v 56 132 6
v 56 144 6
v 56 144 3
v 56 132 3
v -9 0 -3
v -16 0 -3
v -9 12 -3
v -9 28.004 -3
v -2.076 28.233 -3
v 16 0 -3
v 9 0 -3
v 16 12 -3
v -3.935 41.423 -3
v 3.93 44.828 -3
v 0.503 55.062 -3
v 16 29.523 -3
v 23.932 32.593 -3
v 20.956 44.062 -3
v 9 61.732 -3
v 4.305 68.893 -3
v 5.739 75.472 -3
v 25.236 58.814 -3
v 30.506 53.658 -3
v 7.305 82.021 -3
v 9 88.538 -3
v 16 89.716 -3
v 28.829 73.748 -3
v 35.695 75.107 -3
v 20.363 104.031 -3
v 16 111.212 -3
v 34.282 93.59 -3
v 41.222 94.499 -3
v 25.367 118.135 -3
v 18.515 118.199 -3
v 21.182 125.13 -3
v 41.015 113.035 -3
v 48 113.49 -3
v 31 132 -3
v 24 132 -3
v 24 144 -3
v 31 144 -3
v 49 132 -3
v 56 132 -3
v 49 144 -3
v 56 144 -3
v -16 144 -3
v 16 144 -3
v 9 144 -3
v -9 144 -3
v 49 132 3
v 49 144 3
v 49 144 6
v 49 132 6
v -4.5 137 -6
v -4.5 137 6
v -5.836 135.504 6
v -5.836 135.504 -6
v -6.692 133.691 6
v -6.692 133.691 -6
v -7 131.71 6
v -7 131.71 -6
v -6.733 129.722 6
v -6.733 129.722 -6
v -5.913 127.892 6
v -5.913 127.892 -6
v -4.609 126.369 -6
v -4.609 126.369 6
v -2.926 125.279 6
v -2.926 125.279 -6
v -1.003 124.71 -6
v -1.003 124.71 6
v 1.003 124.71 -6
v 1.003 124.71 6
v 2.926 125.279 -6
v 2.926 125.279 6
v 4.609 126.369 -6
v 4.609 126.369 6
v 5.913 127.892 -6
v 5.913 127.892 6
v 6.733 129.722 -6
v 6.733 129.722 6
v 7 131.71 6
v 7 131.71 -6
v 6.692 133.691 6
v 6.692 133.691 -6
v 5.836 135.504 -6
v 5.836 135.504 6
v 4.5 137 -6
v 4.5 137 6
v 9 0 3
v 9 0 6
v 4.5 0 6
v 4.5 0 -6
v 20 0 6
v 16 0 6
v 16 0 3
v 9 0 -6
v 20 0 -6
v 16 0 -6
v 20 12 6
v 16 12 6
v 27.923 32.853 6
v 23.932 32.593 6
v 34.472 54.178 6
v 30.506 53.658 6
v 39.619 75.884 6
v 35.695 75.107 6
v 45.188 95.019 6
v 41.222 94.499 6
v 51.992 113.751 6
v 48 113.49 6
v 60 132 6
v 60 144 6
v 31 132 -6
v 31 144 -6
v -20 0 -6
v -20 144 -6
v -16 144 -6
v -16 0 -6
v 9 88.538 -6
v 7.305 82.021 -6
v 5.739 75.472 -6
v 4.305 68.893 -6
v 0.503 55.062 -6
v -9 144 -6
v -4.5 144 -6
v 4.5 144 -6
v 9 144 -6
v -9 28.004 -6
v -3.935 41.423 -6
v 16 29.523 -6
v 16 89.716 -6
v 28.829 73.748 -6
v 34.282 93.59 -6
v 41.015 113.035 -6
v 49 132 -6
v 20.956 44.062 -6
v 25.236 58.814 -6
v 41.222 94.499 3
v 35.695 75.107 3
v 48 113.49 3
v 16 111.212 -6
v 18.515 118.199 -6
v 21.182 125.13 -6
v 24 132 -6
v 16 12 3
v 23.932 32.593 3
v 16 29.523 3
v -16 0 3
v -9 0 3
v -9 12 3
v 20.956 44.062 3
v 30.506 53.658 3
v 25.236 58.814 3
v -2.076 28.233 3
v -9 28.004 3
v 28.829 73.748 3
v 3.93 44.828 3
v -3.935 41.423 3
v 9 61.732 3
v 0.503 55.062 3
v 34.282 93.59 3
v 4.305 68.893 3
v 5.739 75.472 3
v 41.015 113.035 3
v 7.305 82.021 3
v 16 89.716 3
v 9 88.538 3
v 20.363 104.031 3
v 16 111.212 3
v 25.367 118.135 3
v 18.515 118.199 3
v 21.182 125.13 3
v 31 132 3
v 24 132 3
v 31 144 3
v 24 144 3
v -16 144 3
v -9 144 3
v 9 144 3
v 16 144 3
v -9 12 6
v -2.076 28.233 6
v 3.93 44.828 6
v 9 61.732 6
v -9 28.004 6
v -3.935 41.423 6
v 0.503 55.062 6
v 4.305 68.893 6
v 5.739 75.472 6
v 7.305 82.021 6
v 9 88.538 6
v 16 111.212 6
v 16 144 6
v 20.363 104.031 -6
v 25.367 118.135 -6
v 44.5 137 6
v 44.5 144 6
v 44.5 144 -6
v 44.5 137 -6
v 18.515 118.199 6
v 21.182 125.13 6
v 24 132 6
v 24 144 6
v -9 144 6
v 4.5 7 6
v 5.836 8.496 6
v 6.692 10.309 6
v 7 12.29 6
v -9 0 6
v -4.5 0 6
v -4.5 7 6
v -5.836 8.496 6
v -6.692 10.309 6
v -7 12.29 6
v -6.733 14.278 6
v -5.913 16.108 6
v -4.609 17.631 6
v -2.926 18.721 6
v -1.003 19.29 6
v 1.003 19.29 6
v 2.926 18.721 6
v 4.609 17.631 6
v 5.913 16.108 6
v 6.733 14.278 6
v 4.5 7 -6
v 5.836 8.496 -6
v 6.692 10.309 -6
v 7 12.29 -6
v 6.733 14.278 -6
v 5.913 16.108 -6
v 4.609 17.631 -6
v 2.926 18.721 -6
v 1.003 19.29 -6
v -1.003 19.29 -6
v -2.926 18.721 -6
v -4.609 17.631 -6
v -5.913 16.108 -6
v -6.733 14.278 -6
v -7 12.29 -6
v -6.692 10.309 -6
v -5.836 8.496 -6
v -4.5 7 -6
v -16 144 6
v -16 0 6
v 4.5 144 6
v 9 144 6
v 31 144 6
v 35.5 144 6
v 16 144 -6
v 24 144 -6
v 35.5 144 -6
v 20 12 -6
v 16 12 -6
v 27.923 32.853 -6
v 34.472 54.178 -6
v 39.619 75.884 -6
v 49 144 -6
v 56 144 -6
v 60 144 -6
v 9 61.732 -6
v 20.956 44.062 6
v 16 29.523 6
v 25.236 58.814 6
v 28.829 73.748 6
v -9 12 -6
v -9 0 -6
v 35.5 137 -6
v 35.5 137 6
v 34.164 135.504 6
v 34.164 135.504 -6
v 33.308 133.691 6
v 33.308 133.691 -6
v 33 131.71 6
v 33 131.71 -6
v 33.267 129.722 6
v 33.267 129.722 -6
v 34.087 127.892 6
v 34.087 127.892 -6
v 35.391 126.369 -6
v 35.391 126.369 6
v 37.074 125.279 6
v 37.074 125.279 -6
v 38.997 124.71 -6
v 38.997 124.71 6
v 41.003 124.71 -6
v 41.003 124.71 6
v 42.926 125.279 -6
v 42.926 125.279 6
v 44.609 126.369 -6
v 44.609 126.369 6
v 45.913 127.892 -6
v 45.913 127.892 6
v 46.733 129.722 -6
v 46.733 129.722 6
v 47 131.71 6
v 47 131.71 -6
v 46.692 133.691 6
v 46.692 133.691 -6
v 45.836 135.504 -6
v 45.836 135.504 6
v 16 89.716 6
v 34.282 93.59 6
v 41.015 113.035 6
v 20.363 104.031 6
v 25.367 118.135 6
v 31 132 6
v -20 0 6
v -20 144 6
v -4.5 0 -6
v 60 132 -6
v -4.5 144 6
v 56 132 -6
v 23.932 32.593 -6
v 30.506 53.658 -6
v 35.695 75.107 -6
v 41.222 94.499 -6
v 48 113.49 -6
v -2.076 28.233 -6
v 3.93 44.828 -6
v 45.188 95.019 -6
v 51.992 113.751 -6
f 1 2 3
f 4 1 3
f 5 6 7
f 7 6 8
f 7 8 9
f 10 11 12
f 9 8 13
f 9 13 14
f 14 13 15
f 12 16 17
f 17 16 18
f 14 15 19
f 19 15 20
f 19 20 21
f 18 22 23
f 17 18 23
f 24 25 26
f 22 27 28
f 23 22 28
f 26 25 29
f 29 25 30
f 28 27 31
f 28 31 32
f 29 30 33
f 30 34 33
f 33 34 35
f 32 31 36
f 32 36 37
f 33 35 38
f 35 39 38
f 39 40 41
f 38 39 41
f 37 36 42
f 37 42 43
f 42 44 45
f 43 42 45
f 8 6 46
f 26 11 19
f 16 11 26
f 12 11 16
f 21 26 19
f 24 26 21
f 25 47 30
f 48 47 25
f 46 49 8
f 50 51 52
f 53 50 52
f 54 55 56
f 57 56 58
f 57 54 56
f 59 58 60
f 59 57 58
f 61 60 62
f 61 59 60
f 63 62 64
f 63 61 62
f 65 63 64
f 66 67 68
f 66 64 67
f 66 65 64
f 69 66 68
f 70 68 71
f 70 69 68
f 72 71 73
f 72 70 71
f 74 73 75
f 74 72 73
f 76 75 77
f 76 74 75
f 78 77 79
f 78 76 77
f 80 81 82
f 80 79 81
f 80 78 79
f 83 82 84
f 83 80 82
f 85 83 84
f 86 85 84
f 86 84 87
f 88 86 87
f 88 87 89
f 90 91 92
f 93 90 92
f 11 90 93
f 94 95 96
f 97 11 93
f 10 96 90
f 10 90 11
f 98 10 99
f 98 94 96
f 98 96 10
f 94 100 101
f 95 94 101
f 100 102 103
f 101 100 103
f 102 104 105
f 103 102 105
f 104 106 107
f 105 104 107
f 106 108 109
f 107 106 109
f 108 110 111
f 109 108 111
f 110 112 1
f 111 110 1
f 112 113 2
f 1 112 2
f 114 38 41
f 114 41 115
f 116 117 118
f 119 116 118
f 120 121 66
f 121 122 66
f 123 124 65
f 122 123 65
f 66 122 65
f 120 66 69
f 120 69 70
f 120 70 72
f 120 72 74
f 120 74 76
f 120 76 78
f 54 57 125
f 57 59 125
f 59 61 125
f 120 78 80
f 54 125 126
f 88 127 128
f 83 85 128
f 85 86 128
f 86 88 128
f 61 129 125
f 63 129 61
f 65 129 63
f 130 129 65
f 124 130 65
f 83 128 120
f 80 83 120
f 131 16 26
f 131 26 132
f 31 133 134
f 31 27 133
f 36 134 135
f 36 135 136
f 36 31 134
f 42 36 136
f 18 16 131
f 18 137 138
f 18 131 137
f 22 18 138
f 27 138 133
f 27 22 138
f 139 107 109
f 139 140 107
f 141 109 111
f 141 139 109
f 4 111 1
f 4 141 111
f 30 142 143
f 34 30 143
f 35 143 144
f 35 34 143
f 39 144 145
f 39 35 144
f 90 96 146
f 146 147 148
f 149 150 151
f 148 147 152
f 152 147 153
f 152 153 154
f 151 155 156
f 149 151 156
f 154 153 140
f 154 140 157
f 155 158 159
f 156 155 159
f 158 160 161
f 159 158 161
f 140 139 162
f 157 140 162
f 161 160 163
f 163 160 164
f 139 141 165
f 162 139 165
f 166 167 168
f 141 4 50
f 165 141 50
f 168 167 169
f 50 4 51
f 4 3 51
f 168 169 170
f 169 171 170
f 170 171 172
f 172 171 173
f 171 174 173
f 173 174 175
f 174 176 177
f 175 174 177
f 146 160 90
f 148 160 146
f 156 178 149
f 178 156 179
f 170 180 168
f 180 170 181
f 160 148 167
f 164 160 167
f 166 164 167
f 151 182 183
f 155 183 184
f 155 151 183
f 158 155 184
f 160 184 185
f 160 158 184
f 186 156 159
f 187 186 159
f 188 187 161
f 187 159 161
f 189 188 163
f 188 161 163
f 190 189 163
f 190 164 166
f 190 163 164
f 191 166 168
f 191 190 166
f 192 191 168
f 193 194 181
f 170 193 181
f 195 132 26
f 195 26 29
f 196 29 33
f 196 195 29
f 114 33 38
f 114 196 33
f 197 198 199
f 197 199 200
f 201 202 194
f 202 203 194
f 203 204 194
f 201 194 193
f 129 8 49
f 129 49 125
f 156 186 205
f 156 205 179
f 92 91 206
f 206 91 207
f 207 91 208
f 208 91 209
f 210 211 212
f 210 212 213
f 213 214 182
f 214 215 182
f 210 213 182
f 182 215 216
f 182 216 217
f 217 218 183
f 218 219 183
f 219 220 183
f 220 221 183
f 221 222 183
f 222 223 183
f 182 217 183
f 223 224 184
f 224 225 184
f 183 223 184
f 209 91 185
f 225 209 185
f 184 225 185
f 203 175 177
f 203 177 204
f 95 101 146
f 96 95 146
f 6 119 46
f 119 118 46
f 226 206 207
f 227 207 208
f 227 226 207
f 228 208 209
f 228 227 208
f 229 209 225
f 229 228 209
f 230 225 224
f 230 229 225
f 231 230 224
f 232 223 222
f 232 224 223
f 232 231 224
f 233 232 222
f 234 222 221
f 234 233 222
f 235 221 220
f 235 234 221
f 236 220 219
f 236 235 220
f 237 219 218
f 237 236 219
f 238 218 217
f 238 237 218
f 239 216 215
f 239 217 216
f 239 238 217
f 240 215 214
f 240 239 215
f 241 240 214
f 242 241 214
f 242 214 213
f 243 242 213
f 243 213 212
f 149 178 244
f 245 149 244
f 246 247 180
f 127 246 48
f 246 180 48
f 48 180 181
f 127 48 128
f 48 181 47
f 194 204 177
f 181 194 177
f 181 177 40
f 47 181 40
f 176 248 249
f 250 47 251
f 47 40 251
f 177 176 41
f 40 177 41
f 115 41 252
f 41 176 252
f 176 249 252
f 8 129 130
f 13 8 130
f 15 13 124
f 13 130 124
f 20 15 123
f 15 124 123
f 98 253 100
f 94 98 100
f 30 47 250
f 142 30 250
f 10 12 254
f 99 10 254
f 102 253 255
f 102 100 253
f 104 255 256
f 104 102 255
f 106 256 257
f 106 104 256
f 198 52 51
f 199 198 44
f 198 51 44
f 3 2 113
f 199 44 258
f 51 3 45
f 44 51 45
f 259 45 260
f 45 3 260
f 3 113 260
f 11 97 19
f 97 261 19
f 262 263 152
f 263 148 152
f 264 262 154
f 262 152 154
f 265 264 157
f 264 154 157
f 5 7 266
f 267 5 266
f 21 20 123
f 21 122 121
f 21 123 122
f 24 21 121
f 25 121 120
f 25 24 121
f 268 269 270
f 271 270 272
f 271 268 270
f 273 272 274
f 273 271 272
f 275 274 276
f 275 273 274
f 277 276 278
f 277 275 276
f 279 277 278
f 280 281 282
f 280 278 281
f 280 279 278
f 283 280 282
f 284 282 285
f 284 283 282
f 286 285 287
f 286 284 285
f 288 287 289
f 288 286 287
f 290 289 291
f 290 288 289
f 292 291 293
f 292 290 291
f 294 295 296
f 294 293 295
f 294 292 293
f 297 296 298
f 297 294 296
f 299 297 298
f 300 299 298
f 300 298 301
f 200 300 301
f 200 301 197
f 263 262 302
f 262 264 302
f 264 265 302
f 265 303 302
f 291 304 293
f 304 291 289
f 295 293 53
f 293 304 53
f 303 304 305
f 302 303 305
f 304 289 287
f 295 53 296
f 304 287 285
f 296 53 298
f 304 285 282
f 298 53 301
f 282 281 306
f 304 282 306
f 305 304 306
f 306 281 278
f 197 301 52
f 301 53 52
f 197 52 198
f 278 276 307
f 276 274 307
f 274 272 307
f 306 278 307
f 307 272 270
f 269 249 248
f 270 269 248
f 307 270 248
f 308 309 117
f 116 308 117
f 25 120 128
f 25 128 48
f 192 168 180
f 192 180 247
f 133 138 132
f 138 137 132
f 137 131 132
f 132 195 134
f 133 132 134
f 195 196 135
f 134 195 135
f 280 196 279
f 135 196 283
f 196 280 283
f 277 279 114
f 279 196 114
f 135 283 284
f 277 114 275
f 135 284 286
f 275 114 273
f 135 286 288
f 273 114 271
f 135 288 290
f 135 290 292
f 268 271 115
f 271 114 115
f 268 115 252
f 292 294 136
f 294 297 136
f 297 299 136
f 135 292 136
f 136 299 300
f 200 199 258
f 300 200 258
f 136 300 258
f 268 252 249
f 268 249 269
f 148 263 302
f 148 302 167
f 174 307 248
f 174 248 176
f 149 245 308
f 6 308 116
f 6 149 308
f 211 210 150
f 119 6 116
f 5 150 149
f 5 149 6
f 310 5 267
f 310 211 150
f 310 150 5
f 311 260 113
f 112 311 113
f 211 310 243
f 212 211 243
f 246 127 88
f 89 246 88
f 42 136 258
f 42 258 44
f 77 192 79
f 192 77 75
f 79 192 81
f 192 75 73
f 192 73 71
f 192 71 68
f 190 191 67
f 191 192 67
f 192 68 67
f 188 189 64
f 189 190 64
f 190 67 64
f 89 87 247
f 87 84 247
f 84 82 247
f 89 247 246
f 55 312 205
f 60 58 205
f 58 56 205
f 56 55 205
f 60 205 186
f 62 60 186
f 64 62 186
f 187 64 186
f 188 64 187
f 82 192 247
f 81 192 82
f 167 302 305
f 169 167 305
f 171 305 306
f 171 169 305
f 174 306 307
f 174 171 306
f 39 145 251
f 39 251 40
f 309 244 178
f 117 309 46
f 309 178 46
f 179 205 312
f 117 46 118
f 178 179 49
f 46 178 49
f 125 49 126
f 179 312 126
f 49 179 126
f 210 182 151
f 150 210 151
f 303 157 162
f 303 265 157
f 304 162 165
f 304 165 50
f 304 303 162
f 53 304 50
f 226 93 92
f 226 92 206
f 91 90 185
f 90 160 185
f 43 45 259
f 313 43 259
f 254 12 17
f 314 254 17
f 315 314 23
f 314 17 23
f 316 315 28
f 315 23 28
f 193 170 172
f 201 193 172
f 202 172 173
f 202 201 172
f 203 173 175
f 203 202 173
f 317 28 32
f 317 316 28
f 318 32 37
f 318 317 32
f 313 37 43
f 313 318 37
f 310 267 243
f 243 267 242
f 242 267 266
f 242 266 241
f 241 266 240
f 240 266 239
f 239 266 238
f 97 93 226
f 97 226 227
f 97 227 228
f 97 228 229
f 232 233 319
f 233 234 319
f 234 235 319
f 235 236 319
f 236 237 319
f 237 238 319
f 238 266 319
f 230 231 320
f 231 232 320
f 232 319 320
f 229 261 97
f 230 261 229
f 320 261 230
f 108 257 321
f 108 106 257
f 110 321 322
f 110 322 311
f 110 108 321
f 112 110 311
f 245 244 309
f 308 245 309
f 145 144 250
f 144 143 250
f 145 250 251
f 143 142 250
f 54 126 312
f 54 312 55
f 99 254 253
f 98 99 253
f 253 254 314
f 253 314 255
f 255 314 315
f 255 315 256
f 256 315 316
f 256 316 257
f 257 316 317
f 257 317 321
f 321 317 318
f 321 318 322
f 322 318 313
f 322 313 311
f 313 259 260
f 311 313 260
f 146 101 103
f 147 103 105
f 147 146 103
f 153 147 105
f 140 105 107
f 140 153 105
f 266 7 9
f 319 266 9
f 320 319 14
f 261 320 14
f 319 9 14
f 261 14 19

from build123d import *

# Parameters (mm, degrees)
SKETCH003_W          = 7
SKETCH003_H          = 3
SKETCH004_W          = 7
SKETCH004_H          = 3
SKETCH005_W          = 7
SKETCH005_H          = 3
SKETCH006_W          = 7
SKETCH006_H          = 3
POCKET_DEPTH         = 6.001
POCKET_DEPTH_BACK    = -6.001
POCKET001_DEPTH      = 6.001
POCKET001_DEPTH_BACK = -6.001
POCKET002_DEPTH      = 6.001
POCKET002_DEPTH_BACK = -6.001


with BuildPart() as part:
    # AdditivePipe: sweep along a path in Sketch
    with BuildLine(Plane.XY) as additivepipe_path:
        Line((0, 0), (0, 144))
    # Sketch002 → AdditivePipe (sweep)
    with BuildSketch(Plane.XZ):
        Polygon((-20, 6), (-20, -6), (-16, -6), (-16, -3), (-9, -3), (-9, -6), (9, -6), (9, -3), (16, -3), (16, -6), (20, -6), (20, 6), (16, 6), (16, 3), (9, 3), (9, 6), (-9, 6), (-9, 3), (-16, 3), (-16, 6), align=None)
    sweep(path=additivepipe_path.line)

    # AdditivePipe001: sweep along a path in Sketch001
    with BuildLine(Plane.XY) as additivepipe001_path:
        Line((0, 0), (0, 12))
        ThreePointArc((0, 12), (11.467071, 41.510976), (20, 72))
        ThreePointArc((20, 72), (28.532929, 102.489024), (40, 132))
        Line((40, 132), (40, 144))
    # Sketch002 → AdditivePipe001 (sweep)
    with BuildSketch(Plane.XZ):
        Polygon((-20, 6), (-20, -6), (-16, -6), (-16, -3), (-9, -3), (-9, -6), (9, -6), (9, -3), (16, -3), (16, -6), (20, -6), (20, 6), (16, 6), (16, 3), (9, 3), (9, 6), (-9, 6), (-9, 3), (-16, 3), (-16, 6), align=None)
    sweep(path=additivepipe001_path.line)

    # SubtractivePipe: sweep along a path in Sketch
    with BuildLine(Plane.XY) as subtractivepipe_path:
        Line((0, 0), (0, 144))
    # Sketch003 → SubtractivePipe (sweep, cut)
    with BuildSketch(Plane.XZ):
        with Locations((-12.5, 4.5)):
            Rectangle(SKETCH003_W, SKETCH003_H)
    sweep(path=subtractivepipe_path.line, mode=Mode.SUBTRACT)

    # SubtractivePipe001: sweep along a path in Sketch001
    with BuildLine(Plane.XY) as subtractivepipe001_path:
        Line((0, 0), (0, 12))
        ThreePointArc((0, 12), (11.467071, 41.510976), (20, 72))
        ThreePointArc((20, 72), (28.532929, 102.489024), (40, 132))
        Line((40, 132), (40, 144))
    # Sketch003 → SubtractivePipe001 (sweep, cut)
    with BuildSketch(Plane.XZ):
        with Locations((-12.5, 4.5)):
            Rectangle(SKETCH003_W, SKETCH003_H)
    sweep(path=subtractivepipe001_path.line, mode=Mode.SUBTRACT)

    # SubtractivePipe002: sweep along a path in Sketch
    with BuildLine(Plane.XY) as subtractivepipe002_path:
        Line((0, 0), (0, 144))
    # Sketch004 → SubtractivePipe002 (sweep, cut)
    with BuildSketch(Plane.XZ):
        with Locations((12.5, 4.5)):
            Rectangle(SKETCH004_W, SKETCH004_H)
    sweep(path=subtractivepipe002_path.line, mode=Mode.SUBTRACT)

    # SubtractivePipe003: sweep along a path in Sketch001
    with BuildLine(Plane.XY) as subtractivepipe003_path:
        Line((0, 0), (0, 12))
        ThreePointArc((0, 12), (11.467071, 41.510976), (20, 72))
        ThreePointArc((20, 72), (28.532929, 102.489024), (40, 132))
        Line((40, 132), (40, 144))
    # Sketch004 → SubtractivePipe003 (sweep, cut)
    with BuildSketch(Plane.XZ):
        with Locations((12.5, 4.5)):
            Rectangle(SKETCH004_W, SKETCH004_H)
    sweep(path=subtractivepipe003_path.line, mode=Mode.SUBTRACT)

    # SubtractivePipe004: sweep along a path in Sketch
    with BuildLine(Plane.XY) as subtractivepipe004_path:
        Line((0, 0), (0, 144))
    # Sketch005 → SubtractivePipe004 (sweep, cut)
    with BuildSketch(Plane.XZ):
        with Locations((-12.5, -4.5)):
            Rectangle(SKETCH005_W, SKETCH005_H)
    sweep(path=subtractivepipe004_path.line, mode=Mode.SUBTRACT)

    # SubtractivePipe005: sweep along a path in Sketch001
    with BuildLine(Plane.XY) as subtractivepipe005_path:
        Line((0, 0), (0, 12))
        ThreePointArc((0, 12), (11.467071, 41.510976), (20, 72))
        ThreePointArc((20, 72), (28.532929, 102.489024), (40, 132))
        Line((40, 132), (40, 144))
    # Sketch005 → SubtractivePipe005 (sweep, cut)
    with BuildSketch(Plane.XZ):
        with Locations((-12.5, -4.5)):
            Rectangle(SKETCH005_W, SKETCH005_H)
    sweep(path=subtractivepipe005_path.line, mode=Mode.SUBTRACT)

    # SubtractivePipe006: sweep along a path in Sketch
    with BuildLine(Plane.XY) as subtractivepipe006_path:
        Line((0, 0), (0, 144))
    # Sketch006 → SubtractivePipe006 (sweep, cut)
    with BuildSketch(Plane.XZ):
        with Locations((12.5, -4.5)):
            Rectangle(SKETCH006_W, SKETCH006_H)
    sweep(path=subtractivepipe006_path.line, mode=Mode.SUBTRACT)

    # SubtractivePipe007: sweep along a path in Sketch001
    with BuildLine(Plane.XY) as subtractivepipe007_path:
        Line((0, 0), (0, 12))
        ThreePointArc((0, 12), (11.467071, 41.510976), (20, 72))
        ThreePointArc((20, 72), (28.532929, 102.489024), (40, 132))
        Line((40, 132), (40, 144))
    # Sketch006 → SubtractivePipe007 (sweep, cut)
    with BuildSketch(Plane.XZ):
        with Locations((12.5, -4.5)):
            Rectangle(SKETCH006_W, SKETCH006_H)
    sweep(path=subtractivepipe007_path.line, mode=Mode.SUBTRACT)

    # Sketch007 → Pocket (cut, two sides)
    with BuildSketch(Plane.XY) as pocket_sk:
        with BuildLine():
            Line((-4.5, 0), (4.5, 0))
            Line((4.5, 0), (4.5, 7))
            ThreePointArc((4.5, 7), (0, 19.361903), (-4.5, 7))
            Line((-4.5, 0), (-4.5, 7))
        make_face()
    extrude(amount=-POCKET_DEPTH, mode=Mode.SUBTRACT)
    extrude(pocket_sk.sketch, amount=-POCKET_DEPTH_BACK, mode=Mode.SUBTRACT)

    # Sketch008 → Pocket001 (cut, two sides)
    with BuildSketch(Plane.XY) as pocket001_sk:
        with BuildLine():
            Line((-4.5, 144), (4.5, 144))
            Line((4.5, 144), (4.5, 137))
            ThreePointArc((-4.5, 137), (0, 124.638097), (4.5, 137))
            Line((-4.5, 144), (-4.5, 137))
        make_face()
    extrude(amount=-POCKET001_DEPTH, mode=Mode.SUBTRACT)
    extrude(pocket001_sk.sketch, amount=-POCKET001_DEPTH_BACK, mode=Mode.SUBTRACT)

    # Sketch009 → Pocket002 (cut, two sides)
    with BuildSketch(Plane.XY) as pocket002_sk:
        with BuildLine():
            Line((35.5, 144), (44.5, 144))
            Line((44.5, 144), (44.5, 137))
            ThreePointArc((35.5, 137), (40, 124.638097), (44.5, 137))
            Line((35.5, 144), (35.5, 137))
        make_face()
    extrude(amount=-POCKET002_DEPTH, mode=Mode.SUBTRACT)
    extrude(pocket002_sk.sketch, amount=-POCKET002_DEPTH_BACK, mode=Mode.SUBTRACT)


solid = part.part
